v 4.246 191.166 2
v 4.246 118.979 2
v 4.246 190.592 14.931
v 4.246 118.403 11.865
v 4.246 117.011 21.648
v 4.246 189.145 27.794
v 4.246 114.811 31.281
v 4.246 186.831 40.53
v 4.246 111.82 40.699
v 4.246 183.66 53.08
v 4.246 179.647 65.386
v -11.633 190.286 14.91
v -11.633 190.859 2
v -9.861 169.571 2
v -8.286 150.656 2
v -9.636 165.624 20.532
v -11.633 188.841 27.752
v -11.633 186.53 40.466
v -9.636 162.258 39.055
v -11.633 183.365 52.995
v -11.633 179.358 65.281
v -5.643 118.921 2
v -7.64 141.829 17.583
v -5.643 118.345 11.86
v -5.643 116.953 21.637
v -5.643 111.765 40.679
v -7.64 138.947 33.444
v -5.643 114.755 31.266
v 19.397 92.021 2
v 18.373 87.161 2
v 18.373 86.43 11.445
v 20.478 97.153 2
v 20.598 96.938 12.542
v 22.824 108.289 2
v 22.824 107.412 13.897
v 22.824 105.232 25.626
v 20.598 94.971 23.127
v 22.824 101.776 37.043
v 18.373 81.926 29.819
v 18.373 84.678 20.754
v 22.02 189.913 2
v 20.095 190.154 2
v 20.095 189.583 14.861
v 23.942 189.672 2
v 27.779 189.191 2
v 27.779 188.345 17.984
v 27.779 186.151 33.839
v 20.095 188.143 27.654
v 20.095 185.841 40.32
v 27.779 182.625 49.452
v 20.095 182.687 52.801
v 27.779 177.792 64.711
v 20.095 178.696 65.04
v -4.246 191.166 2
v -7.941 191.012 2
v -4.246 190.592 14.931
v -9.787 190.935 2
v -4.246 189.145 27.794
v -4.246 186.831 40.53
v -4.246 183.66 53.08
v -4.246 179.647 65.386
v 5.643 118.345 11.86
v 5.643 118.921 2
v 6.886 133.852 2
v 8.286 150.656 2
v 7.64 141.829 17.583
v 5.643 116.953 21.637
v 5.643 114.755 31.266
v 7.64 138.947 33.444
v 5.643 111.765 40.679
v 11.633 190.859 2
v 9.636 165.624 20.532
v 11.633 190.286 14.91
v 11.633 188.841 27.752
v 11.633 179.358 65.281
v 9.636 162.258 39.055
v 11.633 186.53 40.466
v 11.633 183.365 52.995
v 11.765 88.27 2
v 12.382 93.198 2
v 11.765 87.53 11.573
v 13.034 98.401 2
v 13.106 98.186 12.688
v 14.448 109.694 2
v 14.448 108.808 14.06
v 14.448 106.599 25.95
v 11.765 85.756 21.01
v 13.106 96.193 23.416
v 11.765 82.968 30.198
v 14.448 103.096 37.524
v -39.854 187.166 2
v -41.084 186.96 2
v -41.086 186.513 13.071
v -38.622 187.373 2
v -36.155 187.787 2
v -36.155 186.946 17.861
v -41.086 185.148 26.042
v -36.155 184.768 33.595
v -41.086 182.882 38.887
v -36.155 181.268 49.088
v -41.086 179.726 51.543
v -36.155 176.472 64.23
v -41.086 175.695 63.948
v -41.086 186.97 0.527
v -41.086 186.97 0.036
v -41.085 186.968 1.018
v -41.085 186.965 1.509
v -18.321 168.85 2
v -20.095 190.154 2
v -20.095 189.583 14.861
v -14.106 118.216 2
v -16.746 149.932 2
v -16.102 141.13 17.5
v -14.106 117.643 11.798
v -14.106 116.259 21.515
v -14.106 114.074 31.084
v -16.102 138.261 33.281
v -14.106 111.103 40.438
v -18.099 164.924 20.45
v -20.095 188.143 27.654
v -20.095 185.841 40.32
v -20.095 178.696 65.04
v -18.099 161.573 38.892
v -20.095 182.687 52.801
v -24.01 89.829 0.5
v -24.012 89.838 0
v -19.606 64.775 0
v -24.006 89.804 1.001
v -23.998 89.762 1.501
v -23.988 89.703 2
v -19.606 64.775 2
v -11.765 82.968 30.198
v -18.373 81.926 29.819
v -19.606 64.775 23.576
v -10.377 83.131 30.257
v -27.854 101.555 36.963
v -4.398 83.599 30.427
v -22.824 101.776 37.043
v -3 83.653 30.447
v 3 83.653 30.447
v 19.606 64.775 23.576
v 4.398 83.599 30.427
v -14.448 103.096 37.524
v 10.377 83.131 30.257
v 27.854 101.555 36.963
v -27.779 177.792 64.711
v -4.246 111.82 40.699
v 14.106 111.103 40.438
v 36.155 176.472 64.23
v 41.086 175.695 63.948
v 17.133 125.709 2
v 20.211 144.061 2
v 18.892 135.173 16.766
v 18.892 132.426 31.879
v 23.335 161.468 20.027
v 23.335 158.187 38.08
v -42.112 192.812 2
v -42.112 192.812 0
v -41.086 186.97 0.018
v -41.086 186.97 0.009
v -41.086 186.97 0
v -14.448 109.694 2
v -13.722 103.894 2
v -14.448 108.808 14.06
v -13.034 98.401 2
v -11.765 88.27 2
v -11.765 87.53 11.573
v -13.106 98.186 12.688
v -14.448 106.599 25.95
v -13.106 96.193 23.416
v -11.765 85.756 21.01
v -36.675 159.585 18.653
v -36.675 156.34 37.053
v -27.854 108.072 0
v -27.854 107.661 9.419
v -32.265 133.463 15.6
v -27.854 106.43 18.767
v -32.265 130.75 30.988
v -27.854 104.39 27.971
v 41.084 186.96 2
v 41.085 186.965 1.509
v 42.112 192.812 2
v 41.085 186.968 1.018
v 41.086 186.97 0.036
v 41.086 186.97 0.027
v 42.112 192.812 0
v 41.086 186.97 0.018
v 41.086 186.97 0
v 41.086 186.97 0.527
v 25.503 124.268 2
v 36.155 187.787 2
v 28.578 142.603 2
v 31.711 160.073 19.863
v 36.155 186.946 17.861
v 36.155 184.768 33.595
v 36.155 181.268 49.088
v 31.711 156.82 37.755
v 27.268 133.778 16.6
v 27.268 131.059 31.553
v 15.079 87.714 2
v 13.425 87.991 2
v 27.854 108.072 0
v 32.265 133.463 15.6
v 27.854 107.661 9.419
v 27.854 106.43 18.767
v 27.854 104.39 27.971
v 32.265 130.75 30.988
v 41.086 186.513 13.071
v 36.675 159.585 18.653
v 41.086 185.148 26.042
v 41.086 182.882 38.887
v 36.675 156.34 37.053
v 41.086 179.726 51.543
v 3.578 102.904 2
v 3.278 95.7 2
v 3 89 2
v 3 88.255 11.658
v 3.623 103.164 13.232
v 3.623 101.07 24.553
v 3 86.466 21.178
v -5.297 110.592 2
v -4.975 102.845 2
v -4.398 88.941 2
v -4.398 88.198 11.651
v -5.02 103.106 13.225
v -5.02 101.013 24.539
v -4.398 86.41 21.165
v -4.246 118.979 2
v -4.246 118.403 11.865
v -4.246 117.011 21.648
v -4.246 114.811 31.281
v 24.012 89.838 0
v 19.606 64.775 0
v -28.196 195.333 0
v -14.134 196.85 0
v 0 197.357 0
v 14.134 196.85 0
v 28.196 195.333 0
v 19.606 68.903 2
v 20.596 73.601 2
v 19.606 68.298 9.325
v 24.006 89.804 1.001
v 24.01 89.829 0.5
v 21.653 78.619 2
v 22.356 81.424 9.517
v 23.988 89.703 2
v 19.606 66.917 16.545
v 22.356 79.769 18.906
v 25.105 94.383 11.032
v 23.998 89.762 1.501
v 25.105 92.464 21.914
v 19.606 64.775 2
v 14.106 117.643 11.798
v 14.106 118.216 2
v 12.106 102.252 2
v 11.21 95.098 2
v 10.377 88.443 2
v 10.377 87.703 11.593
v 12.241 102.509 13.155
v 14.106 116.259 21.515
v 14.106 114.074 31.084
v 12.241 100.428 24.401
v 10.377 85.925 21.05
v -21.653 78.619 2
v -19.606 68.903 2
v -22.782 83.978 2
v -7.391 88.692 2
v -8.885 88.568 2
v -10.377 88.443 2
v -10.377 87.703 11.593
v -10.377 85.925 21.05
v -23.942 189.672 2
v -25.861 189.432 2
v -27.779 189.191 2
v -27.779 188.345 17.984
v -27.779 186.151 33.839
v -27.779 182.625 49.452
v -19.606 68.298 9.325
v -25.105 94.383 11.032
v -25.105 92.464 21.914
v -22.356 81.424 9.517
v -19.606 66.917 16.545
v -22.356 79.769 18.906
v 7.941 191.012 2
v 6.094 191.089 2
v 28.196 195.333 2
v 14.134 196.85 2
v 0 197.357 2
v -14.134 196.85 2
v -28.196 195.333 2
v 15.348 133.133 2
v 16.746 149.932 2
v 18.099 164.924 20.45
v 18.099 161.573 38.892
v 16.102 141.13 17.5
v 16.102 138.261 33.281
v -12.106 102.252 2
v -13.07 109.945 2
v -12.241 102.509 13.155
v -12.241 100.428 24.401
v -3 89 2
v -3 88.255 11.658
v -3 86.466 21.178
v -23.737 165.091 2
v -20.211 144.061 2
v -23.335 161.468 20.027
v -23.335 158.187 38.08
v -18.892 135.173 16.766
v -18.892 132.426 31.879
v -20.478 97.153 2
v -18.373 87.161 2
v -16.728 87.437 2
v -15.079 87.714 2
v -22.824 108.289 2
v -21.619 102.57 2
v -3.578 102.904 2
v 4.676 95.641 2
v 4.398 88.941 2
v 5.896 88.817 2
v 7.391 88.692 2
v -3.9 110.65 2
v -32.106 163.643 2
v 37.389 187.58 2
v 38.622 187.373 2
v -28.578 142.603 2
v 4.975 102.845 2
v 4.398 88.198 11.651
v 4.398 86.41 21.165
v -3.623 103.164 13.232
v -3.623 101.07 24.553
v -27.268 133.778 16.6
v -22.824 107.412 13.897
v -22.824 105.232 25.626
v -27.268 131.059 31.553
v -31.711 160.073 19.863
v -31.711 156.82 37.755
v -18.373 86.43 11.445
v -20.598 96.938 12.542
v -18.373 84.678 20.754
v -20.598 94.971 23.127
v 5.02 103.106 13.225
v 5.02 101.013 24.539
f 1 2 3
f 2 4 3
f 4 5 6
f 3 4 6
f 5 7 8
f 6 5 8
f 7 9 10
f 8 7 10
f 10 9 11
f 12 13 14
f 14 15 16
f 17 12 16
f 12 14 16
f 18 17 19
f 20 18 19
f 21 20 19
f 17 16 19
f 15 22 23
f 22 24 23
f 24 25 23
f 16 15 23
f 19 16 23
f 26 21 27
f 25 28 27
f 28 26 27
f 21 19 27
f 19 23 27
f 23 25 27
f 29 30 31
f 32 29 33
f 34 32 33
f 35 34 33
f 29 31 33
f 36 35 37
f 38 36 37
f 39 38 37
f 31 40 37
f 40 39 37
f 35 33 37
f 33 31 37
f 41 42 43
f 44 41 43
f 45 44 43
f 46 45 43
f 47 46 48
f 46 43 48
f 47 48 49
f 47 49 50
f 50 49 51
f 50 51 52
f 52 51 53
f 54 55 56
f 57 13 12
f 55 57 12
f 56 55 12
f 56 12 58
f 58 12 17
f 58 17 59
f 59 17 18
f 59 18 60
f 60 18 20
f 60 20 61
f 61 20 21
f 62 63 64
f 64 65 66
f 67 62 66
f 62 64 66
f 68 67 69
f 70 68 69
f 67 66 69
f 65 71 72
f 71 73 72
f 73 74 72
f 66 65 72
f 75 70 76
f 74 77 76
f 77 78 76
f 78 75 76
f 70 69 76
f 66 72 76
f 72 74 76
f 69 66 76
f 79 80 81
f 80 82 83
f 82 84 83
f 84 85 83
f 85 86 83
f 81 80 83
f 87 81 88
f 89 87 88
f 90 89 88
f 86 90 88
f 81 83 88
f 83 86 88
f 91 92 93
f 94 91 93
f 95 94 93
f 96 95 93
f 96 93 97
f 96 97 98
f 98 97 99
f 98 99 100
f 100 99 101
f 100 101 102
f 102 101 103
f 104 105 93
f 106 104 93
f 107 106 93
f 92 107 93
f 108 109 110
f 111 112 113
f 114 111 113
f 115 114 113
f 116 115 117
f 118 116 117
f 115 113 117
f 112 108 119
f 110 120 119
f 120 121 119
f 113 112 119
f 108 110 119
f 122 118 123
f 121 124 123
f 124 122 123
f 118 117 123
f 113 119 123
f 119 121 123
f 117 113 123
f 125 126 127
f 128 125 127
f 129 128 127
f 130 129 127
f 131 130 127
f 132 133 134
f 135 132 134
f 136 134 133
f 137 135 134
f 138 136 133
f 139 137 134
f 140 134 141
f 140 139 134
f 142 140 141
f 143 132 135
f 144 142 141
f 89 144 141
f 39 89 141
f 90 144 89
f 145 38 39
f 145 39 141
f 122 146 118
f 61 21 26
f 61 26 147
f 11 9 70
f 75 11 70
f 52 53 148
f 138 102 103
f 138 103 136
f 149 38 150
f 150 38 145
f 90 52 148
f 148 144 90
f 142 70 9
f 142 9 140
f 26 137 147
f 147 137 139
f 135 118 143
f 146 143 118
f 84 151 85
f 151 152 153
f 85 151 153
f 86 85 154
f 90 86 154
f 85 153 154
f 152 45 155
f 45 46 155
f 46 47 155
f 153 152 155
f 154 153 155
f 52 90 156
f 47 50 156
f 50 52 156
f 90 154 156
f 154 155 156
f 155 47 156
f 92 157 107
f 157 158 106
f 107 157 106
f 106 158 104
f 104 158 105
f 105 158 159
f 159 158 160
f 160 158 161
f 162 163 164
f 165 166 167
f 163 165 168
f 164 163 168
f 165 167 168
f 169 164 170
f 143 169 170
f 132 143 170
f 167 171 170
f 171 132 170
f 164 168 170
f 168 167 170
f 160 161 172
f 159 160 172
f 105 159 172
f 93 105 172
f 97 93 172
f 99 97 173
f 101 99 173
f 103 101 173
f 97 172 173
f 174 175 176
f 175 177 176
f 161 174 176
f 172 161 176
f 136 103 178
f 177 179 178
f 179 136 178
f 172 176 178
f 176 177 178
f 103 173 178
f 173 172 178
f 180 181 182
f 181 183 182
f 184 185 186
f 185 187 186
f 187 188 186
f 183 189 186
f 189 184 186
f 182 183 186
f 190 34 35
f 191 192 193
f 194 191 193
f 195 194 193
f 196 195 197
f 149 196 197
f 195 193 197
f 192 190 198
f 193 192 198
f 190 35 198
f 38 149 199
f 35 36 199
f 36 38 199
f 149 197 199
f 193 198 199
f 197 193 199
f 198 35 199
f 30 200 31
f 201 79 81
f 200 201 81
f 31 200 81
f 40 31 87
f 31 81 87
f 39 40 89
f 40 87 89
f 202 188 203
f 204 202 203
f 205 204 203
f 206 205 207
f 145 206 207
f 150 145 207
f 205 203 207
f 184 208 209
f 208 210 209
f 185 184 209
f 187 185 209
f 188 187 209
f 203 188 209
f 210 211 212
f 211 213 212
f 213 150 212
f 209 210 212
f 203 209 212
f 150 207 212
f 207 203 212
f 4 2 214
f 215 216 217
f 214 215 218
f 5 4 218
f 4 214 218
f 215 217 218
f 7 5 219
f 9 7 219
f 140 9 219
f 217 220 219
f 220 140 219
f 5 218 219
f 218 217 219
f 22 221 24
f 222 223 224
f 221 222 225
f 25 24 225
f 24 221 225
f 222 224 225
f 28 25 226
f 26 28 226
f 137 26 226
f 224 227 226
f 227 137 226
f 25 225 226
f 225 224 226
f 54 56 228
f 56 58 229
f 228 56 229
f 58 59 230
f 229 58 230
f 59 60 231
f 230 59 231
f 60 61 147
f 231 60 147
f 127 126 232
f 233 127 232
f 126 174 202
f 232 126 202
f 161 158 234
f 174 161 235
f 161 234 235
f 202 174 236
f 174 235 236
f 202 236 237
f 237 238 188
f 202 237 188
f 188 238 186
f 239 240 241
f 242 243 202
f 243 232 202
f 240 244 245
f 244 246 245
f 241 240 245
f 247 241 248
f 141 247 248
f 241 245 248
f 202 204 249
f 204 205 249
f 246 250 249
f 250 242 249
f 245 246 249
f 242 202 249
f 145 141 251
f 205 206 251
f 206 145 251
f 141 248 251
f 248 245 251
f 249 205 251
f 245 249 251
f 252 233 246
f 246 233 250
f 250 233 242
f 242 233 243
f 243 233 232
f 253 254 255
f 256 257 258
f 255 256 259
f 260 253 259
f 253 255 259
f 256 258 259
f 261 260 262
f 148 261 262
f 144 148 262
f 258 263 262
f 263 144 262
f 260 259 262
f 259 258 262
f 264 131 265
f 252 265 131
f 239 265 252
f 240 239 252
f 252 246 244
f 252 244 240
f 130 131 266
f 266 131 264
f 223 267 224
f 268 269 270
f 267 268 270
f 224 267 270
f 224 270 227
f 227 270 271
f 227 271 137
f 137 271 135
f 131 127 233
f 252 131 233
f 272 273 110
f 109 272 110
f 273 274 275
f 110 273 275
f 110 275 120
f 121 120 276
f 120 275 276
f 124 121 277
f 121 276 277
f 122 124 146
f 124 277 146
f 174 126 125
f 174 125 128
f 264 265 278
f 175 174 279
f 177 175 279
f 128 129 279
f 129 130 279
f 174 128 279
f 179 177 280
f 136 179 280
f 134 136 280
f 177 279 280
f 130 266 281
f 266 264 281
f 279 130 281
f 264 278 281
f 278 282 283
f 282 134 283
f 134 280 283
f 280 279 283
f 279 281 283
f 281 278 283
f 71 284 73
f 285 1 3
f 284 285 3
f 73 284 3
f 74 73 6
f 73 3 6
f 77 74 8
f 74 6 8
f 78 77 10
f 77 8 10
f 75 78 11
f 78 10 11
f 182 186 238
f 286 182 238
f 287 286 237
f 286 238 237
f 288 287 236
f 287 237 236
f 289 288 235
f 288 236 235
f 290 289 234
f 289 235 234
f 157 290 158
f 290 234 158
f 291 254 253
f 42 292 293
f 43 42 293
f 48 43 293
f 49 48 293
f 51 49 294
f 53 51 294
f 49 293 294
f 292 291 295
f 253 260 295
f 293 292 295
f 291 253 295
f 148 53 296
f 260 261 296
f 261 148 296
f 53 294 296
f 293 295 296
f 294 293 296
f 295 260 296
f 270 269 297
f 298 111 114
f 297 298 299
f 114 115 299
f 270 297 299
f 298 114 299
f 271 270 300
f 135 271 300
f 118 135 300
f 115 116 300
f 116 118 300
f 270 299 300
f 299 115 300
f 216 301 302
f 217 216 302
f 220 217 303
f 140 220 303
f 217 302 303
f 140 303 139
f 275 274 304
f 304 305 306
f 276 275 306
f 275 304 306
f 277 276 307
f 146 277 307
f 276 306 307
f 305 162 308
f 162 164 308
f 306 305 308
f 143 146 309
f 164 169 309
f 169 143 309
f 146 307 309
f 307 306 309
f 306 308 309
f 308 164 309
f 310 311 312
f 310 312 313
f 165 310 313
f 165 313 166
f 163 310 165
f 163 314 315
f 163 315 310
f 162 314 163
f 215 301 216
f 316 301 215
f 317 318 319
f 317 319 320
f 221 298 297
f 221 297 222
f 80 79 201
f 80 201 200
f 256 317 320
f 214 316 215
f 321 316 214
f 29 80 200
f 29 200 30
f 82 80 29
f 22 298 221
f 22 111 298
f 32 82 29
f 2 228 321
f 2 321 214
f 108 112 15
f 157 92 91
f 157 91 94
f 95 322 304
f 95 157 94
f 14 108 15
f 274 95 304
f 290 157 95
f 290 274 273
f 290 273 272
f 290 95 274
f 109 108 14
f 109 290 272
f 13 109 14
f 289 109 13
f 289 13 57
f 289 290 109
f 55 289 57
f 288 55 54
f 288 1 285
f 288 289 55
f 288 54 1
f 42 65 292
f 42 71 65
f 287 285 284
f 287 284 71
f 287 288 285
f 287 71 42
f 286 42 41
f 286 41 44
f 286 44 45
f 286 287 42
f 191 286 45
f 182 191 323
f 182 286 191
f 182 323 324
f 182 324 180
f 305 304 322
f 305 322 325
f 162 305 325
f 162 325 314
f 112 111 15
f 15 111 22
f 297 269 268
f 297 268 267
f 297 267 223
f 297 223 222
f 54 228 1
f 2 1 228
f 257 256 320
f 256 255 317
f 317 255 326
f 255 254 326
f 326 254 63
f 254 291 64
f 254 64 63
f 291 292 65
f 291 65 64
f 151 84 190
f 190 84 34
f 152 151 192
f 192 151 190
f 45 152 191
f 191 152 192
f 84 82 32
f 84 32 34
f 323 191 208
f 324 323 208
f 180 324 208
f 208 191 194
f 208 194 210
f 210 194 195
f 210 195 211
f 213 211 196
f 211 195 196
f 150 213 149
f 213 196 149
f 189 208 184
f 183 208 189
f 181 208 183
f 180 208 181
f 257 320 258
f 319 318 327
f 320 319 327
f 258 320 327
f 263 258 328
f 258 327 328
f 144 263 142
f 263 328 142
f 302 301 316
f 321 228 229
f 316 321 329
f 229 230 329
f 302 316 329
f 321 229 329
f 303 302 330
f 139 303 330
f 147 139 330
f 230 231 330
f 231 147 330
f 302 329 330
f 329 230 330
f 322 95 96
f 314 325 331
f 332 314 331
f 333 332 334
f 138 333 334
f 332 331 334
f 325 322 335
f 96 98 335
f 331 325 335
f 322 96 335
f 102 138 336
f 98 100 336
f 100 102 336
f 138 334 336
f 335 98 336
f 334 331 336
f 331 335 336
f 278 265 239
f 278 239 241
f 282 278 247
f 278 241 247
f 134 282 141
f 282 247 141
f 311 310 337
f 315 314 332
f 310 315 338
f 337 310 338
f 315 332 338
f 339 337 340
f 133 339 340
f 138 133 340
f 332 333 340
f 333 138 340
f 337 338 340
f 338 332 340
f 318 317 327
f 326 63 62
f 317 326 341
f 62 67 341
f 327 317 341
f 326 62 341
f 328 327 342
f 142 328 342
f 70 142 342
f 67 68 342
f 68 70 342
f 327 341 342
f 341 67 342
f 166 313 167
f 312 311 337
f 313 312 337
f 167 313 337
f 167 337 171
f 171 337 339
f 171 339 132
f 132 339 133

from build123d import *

# Parameters (mm, degrees)
REVOLUTION_ANGLE = 20
PAD_DEPTH        = 2


with BuildPart() as part:
    # Sketch → Revolution (revolve)
    with BuildSketch(Plane.XY):
        Polygon((-18.372564, 87.184066), (-22.823988, 108.307586), (-36.154546, 187.797393), (-41.085685, 186.970434), (-27.854335, 108.072199), (-19.606168, 68.93184), (19.606168, 68.93184), (27.854335, 108.072199), (41.085685, 186.970434), (36.154546, 187.797393), (22.823988, 108.307586), (18.372564, 87.184066), (11.764837, 88.292191), (14.448033, 109.712246), (27.778591, 189.202053), (20.095372, 190.164496), (14.105719, 118.233415), (10.376892, 88.466053), (4.397586, 88.963946), (5.643392, 118.938068), (11.633046, 190.869148), (4.245807, 191.176182), (4.245807, 118.996155), (3, 89.022034), (-3, 89.022034), (-4.245807, 118.996155), (-4.245807, 191.176182), (-11.633046, 190.869148), (-5.643392, 118.938068), (-4.397586, 88.963946), (-10.376892, 88.466053), (-14.105719, 118.233415), (-20.095372, 190.164496), (-27.778591, 189.202053), (-14.448033, 109.712246), (-11.764837, 88.292191), align=None)
    revolve(axis=Axis((0, 0, 0), (1, 0, 0)), revolution_arc=REVOLUTION_ANGLE)

    # Sketch001 → Pad (new body)
    with BuildSketch(Plane.XY):
        with BuildLine():
            ThreePointArc((42.112464, 192.811715), (0, 197.35708), (-42.112464, 192.811715))
            Line((-42.112464, 192.811715), (-19.606168, 64.774741))
            Line((-19.606168, 64.774741), (19.606168, 64.774741))
            Line((19.606168, 64.774741), (42.112464, 192.811715))
        make_face()
    extrude(amount=PAD_DEPTH)


solid = part.part
